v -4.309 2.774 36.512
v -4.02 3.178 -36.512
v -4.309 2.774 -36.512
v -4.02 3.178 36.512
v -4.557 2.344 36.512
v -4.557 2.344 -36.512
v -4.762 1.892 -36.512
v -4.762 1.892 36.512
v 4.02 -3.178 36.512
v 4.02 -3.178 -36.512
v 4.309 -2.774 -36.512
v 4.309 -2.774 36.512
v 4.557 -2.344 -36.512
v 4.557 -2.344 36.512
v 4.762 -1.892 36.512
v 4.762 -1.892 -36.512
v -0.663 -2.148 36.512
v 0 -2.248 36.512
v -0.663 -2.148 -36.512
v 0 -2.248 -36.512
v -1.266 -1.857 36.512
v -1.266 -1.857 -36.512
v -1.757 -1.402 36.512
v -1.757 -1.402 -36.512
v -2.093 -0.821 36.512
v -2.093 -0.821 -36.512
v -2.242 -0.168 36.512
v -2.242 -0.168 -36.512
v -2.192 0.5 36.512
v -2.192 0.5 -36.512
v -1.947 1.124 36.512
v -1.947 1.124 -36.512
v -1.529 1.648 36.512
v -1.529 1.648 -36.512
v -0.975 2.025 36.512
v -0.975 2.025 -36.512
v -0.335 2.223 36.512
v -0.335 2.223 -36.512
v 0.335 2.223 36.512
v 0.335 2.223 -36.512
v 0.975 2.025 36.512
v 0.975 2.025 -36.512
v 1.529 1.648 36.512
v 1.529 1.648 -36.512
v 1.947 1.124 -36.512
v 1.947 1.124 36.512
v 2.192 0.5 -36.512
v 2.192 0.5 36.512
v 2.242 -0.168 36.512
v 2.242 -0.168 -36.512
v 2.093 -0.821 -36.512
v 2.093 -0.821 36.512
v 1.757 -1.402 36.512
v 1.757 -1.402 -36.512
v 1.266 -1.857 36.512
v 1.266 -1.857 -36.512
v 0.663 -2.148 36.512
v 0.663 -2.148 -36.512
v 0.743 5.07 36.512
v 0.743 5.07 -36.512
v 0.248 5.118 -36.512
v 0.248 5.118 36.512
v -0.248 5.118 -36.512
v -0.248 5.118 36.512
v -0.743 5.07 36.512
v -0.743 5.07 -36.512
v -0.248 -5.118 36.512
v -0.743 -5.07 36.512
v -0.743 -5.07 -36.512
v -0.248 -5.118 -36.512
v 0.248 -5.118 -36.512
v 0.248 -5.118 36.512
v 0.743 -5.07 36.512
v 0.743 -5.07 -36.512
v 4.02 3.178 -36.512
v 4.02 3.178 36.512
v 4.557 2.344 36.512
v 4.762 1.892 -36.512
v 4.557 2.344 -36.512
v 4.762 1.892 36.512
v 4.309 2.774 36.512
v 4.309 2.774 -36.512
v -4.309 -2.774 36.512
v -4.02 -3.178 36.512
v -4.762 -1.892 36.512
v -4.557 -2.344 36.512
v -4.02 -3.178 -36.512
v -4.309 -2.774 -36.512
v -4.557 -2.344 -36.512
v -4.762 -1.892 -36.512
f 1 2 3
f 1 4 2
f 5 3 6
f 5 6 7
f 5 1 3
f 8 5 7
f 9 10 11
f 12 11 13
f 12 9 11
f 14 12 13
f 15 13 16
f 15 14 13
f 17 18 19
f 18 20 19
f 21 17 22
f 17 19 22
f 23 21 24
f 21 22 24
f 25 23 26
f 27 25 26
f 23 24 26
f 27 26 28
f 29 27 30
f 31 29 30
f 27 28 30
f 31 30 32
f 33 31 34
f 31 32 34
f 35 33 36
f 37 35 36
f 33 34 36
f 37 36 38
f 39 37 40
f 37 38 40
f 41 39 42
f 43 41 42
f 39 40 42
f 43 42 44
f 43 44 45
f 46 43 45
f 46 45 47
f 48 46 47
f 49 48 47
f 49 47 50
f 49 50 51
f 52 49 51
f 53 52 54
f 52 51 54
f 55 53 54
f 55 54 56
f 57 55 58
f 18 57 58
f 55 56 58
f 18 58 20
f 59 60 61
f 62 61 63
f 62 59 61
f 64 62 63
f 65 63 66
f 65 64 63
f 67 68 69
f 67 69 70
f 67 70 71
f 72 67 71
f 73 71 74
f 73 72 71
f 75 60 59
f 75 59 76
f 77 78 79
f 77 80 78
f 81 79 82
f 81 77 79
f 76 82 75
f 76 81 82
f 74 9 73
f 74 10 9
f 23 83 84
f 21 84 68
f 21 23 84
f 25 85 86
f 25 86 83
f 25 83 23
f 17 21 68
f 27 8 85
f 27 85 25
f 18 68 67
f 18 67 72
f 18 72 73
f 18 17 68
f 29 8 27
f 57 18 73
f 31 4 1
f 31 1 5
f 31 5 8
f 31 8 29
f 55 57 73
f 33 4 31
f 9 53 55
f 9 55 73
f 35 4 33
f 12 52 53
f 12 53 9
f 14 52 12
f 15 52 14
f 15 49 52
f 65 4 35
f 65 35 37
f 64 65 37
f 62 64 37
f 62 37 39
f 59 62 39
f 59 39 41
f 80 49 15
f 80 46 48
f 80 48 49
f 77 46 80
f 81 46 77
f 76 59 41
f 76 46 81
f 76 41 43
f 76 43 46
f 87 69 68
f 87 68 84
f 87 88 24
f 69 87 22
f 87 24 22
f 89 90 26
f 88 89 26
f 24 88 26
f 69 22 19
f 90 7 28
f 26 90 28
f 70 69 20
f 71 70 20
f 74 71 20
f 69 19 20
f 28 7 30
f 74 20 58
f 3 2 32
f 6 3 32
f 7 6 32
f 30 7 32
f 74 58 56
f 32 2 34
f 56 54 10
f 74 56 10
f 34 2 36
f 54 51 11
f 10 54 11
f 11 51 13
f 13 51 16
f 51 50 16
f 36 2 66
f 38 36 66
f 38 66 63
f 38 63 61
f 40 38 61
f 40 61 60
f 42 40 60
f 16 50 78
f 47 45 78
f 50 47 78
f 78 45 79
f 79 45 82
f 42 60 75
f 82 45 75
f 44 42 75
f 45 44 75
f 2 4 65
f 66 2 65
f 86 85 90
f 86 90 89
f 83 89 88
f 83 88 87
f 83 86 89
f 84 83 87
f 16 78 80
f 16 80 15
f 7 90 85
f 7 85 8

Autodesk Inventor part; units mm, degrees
ref_plane "YZ Plane" through (0, 0, 0) normal (1, 0, 0) x (0, 1, 0)
ref_plane "XZ Plane" through (0, 0, 0) normal (0, 1, 0) x (-1, 0, 0)
ref_plane "XY Plane" through (0, 0, 0) normal (0, 0, 1) x (1, 0, 0)
sketch "Sketch1" plane through (0, 0, 0) normal (0, 0, 1) x (1, 0, 0)
  line L0 (-4.7625, -2.7496) -> (-4.7625, 2.7496)
  line L1 (-4.7625, 2.7496) -> (0, 5.4993)
  line L2 (0, 5.4993) -> (4.7625, 2.7496)
  line L3 (4.7625, 2.7496) -> (4.7625, -2.7496)
  line L4 (4.7625, -2.7496) -> (0, -5.4993)
  line L5 (0, -5.4993) -> (-4.7625, -2.7496)
  point P0 (0, 0)
  point P1 (0, 0)
  dimension "Size" = 9.525
extrude "Extrusion1" add sketch "Sketch1" along normal mid plane 73.025
sketch "Sketch3" plane through (0, 0, 36.5125) normal (0, 0, 1) x (1, 0, 0)
  line L0 (-4.7625, 2.7496) -> (0, 5.4993) construction
  line L1 (0, 5.4993) -> (4.7625, 2.7496) construction
  line L2 (4.7625, 2.7496) -> (4.7625, -2.7496) construction
  line L3 (4.7625, -2.7496) -> (0, -5.4993) construction
  line L4 (0, -5.4993) -> (-4.7625, -2.7496) construction
  line L5 (-4.7625, -2.7496) -> (-4.7625, 2.7496) construction
  point P0 (0, 0)
hole "Hole1" at (0, 0, 36.5125) direction (0, 0, -1) diameter 4.4958 end through all
sketch "Sketch4" plane through (0, 0, 36.5125) normal (0, 0, 1) x (1, 0, 0)
  circle A0 centre (0, 0) radius 2.2479 construction
  line L0 (-4.7625, 2.7496) -> (0, 5.4993) construction
  line L1 (0, 5.4993) -> (4.7625, 2.7496) construction
  line L2 (4.7625, 2.7496) -> (4.7625, -2.7496) construction
  line L3 (4.7625, -2.7496) -> (0, -5.4993) construction
  line L4 (0, -5.4993) -> (-4.7625, -2.7496) construction
  line L5 (-4.7625, -2.7496) -> (-4.7625, 2.7496) construction
  circle A1 centre (0, 0) radius 5.1245
  circle A2 centre (0, 0) radius 8.89
  dimension "thunder" = 10.2489
  dimension "d16" = 17.78
extrude "Extrusion3" cut sketch "Sketch4" against normal through all
equation "\"bearing\" = 25.4"
properties part number "GP1-004" material "Aluminum 6061"
